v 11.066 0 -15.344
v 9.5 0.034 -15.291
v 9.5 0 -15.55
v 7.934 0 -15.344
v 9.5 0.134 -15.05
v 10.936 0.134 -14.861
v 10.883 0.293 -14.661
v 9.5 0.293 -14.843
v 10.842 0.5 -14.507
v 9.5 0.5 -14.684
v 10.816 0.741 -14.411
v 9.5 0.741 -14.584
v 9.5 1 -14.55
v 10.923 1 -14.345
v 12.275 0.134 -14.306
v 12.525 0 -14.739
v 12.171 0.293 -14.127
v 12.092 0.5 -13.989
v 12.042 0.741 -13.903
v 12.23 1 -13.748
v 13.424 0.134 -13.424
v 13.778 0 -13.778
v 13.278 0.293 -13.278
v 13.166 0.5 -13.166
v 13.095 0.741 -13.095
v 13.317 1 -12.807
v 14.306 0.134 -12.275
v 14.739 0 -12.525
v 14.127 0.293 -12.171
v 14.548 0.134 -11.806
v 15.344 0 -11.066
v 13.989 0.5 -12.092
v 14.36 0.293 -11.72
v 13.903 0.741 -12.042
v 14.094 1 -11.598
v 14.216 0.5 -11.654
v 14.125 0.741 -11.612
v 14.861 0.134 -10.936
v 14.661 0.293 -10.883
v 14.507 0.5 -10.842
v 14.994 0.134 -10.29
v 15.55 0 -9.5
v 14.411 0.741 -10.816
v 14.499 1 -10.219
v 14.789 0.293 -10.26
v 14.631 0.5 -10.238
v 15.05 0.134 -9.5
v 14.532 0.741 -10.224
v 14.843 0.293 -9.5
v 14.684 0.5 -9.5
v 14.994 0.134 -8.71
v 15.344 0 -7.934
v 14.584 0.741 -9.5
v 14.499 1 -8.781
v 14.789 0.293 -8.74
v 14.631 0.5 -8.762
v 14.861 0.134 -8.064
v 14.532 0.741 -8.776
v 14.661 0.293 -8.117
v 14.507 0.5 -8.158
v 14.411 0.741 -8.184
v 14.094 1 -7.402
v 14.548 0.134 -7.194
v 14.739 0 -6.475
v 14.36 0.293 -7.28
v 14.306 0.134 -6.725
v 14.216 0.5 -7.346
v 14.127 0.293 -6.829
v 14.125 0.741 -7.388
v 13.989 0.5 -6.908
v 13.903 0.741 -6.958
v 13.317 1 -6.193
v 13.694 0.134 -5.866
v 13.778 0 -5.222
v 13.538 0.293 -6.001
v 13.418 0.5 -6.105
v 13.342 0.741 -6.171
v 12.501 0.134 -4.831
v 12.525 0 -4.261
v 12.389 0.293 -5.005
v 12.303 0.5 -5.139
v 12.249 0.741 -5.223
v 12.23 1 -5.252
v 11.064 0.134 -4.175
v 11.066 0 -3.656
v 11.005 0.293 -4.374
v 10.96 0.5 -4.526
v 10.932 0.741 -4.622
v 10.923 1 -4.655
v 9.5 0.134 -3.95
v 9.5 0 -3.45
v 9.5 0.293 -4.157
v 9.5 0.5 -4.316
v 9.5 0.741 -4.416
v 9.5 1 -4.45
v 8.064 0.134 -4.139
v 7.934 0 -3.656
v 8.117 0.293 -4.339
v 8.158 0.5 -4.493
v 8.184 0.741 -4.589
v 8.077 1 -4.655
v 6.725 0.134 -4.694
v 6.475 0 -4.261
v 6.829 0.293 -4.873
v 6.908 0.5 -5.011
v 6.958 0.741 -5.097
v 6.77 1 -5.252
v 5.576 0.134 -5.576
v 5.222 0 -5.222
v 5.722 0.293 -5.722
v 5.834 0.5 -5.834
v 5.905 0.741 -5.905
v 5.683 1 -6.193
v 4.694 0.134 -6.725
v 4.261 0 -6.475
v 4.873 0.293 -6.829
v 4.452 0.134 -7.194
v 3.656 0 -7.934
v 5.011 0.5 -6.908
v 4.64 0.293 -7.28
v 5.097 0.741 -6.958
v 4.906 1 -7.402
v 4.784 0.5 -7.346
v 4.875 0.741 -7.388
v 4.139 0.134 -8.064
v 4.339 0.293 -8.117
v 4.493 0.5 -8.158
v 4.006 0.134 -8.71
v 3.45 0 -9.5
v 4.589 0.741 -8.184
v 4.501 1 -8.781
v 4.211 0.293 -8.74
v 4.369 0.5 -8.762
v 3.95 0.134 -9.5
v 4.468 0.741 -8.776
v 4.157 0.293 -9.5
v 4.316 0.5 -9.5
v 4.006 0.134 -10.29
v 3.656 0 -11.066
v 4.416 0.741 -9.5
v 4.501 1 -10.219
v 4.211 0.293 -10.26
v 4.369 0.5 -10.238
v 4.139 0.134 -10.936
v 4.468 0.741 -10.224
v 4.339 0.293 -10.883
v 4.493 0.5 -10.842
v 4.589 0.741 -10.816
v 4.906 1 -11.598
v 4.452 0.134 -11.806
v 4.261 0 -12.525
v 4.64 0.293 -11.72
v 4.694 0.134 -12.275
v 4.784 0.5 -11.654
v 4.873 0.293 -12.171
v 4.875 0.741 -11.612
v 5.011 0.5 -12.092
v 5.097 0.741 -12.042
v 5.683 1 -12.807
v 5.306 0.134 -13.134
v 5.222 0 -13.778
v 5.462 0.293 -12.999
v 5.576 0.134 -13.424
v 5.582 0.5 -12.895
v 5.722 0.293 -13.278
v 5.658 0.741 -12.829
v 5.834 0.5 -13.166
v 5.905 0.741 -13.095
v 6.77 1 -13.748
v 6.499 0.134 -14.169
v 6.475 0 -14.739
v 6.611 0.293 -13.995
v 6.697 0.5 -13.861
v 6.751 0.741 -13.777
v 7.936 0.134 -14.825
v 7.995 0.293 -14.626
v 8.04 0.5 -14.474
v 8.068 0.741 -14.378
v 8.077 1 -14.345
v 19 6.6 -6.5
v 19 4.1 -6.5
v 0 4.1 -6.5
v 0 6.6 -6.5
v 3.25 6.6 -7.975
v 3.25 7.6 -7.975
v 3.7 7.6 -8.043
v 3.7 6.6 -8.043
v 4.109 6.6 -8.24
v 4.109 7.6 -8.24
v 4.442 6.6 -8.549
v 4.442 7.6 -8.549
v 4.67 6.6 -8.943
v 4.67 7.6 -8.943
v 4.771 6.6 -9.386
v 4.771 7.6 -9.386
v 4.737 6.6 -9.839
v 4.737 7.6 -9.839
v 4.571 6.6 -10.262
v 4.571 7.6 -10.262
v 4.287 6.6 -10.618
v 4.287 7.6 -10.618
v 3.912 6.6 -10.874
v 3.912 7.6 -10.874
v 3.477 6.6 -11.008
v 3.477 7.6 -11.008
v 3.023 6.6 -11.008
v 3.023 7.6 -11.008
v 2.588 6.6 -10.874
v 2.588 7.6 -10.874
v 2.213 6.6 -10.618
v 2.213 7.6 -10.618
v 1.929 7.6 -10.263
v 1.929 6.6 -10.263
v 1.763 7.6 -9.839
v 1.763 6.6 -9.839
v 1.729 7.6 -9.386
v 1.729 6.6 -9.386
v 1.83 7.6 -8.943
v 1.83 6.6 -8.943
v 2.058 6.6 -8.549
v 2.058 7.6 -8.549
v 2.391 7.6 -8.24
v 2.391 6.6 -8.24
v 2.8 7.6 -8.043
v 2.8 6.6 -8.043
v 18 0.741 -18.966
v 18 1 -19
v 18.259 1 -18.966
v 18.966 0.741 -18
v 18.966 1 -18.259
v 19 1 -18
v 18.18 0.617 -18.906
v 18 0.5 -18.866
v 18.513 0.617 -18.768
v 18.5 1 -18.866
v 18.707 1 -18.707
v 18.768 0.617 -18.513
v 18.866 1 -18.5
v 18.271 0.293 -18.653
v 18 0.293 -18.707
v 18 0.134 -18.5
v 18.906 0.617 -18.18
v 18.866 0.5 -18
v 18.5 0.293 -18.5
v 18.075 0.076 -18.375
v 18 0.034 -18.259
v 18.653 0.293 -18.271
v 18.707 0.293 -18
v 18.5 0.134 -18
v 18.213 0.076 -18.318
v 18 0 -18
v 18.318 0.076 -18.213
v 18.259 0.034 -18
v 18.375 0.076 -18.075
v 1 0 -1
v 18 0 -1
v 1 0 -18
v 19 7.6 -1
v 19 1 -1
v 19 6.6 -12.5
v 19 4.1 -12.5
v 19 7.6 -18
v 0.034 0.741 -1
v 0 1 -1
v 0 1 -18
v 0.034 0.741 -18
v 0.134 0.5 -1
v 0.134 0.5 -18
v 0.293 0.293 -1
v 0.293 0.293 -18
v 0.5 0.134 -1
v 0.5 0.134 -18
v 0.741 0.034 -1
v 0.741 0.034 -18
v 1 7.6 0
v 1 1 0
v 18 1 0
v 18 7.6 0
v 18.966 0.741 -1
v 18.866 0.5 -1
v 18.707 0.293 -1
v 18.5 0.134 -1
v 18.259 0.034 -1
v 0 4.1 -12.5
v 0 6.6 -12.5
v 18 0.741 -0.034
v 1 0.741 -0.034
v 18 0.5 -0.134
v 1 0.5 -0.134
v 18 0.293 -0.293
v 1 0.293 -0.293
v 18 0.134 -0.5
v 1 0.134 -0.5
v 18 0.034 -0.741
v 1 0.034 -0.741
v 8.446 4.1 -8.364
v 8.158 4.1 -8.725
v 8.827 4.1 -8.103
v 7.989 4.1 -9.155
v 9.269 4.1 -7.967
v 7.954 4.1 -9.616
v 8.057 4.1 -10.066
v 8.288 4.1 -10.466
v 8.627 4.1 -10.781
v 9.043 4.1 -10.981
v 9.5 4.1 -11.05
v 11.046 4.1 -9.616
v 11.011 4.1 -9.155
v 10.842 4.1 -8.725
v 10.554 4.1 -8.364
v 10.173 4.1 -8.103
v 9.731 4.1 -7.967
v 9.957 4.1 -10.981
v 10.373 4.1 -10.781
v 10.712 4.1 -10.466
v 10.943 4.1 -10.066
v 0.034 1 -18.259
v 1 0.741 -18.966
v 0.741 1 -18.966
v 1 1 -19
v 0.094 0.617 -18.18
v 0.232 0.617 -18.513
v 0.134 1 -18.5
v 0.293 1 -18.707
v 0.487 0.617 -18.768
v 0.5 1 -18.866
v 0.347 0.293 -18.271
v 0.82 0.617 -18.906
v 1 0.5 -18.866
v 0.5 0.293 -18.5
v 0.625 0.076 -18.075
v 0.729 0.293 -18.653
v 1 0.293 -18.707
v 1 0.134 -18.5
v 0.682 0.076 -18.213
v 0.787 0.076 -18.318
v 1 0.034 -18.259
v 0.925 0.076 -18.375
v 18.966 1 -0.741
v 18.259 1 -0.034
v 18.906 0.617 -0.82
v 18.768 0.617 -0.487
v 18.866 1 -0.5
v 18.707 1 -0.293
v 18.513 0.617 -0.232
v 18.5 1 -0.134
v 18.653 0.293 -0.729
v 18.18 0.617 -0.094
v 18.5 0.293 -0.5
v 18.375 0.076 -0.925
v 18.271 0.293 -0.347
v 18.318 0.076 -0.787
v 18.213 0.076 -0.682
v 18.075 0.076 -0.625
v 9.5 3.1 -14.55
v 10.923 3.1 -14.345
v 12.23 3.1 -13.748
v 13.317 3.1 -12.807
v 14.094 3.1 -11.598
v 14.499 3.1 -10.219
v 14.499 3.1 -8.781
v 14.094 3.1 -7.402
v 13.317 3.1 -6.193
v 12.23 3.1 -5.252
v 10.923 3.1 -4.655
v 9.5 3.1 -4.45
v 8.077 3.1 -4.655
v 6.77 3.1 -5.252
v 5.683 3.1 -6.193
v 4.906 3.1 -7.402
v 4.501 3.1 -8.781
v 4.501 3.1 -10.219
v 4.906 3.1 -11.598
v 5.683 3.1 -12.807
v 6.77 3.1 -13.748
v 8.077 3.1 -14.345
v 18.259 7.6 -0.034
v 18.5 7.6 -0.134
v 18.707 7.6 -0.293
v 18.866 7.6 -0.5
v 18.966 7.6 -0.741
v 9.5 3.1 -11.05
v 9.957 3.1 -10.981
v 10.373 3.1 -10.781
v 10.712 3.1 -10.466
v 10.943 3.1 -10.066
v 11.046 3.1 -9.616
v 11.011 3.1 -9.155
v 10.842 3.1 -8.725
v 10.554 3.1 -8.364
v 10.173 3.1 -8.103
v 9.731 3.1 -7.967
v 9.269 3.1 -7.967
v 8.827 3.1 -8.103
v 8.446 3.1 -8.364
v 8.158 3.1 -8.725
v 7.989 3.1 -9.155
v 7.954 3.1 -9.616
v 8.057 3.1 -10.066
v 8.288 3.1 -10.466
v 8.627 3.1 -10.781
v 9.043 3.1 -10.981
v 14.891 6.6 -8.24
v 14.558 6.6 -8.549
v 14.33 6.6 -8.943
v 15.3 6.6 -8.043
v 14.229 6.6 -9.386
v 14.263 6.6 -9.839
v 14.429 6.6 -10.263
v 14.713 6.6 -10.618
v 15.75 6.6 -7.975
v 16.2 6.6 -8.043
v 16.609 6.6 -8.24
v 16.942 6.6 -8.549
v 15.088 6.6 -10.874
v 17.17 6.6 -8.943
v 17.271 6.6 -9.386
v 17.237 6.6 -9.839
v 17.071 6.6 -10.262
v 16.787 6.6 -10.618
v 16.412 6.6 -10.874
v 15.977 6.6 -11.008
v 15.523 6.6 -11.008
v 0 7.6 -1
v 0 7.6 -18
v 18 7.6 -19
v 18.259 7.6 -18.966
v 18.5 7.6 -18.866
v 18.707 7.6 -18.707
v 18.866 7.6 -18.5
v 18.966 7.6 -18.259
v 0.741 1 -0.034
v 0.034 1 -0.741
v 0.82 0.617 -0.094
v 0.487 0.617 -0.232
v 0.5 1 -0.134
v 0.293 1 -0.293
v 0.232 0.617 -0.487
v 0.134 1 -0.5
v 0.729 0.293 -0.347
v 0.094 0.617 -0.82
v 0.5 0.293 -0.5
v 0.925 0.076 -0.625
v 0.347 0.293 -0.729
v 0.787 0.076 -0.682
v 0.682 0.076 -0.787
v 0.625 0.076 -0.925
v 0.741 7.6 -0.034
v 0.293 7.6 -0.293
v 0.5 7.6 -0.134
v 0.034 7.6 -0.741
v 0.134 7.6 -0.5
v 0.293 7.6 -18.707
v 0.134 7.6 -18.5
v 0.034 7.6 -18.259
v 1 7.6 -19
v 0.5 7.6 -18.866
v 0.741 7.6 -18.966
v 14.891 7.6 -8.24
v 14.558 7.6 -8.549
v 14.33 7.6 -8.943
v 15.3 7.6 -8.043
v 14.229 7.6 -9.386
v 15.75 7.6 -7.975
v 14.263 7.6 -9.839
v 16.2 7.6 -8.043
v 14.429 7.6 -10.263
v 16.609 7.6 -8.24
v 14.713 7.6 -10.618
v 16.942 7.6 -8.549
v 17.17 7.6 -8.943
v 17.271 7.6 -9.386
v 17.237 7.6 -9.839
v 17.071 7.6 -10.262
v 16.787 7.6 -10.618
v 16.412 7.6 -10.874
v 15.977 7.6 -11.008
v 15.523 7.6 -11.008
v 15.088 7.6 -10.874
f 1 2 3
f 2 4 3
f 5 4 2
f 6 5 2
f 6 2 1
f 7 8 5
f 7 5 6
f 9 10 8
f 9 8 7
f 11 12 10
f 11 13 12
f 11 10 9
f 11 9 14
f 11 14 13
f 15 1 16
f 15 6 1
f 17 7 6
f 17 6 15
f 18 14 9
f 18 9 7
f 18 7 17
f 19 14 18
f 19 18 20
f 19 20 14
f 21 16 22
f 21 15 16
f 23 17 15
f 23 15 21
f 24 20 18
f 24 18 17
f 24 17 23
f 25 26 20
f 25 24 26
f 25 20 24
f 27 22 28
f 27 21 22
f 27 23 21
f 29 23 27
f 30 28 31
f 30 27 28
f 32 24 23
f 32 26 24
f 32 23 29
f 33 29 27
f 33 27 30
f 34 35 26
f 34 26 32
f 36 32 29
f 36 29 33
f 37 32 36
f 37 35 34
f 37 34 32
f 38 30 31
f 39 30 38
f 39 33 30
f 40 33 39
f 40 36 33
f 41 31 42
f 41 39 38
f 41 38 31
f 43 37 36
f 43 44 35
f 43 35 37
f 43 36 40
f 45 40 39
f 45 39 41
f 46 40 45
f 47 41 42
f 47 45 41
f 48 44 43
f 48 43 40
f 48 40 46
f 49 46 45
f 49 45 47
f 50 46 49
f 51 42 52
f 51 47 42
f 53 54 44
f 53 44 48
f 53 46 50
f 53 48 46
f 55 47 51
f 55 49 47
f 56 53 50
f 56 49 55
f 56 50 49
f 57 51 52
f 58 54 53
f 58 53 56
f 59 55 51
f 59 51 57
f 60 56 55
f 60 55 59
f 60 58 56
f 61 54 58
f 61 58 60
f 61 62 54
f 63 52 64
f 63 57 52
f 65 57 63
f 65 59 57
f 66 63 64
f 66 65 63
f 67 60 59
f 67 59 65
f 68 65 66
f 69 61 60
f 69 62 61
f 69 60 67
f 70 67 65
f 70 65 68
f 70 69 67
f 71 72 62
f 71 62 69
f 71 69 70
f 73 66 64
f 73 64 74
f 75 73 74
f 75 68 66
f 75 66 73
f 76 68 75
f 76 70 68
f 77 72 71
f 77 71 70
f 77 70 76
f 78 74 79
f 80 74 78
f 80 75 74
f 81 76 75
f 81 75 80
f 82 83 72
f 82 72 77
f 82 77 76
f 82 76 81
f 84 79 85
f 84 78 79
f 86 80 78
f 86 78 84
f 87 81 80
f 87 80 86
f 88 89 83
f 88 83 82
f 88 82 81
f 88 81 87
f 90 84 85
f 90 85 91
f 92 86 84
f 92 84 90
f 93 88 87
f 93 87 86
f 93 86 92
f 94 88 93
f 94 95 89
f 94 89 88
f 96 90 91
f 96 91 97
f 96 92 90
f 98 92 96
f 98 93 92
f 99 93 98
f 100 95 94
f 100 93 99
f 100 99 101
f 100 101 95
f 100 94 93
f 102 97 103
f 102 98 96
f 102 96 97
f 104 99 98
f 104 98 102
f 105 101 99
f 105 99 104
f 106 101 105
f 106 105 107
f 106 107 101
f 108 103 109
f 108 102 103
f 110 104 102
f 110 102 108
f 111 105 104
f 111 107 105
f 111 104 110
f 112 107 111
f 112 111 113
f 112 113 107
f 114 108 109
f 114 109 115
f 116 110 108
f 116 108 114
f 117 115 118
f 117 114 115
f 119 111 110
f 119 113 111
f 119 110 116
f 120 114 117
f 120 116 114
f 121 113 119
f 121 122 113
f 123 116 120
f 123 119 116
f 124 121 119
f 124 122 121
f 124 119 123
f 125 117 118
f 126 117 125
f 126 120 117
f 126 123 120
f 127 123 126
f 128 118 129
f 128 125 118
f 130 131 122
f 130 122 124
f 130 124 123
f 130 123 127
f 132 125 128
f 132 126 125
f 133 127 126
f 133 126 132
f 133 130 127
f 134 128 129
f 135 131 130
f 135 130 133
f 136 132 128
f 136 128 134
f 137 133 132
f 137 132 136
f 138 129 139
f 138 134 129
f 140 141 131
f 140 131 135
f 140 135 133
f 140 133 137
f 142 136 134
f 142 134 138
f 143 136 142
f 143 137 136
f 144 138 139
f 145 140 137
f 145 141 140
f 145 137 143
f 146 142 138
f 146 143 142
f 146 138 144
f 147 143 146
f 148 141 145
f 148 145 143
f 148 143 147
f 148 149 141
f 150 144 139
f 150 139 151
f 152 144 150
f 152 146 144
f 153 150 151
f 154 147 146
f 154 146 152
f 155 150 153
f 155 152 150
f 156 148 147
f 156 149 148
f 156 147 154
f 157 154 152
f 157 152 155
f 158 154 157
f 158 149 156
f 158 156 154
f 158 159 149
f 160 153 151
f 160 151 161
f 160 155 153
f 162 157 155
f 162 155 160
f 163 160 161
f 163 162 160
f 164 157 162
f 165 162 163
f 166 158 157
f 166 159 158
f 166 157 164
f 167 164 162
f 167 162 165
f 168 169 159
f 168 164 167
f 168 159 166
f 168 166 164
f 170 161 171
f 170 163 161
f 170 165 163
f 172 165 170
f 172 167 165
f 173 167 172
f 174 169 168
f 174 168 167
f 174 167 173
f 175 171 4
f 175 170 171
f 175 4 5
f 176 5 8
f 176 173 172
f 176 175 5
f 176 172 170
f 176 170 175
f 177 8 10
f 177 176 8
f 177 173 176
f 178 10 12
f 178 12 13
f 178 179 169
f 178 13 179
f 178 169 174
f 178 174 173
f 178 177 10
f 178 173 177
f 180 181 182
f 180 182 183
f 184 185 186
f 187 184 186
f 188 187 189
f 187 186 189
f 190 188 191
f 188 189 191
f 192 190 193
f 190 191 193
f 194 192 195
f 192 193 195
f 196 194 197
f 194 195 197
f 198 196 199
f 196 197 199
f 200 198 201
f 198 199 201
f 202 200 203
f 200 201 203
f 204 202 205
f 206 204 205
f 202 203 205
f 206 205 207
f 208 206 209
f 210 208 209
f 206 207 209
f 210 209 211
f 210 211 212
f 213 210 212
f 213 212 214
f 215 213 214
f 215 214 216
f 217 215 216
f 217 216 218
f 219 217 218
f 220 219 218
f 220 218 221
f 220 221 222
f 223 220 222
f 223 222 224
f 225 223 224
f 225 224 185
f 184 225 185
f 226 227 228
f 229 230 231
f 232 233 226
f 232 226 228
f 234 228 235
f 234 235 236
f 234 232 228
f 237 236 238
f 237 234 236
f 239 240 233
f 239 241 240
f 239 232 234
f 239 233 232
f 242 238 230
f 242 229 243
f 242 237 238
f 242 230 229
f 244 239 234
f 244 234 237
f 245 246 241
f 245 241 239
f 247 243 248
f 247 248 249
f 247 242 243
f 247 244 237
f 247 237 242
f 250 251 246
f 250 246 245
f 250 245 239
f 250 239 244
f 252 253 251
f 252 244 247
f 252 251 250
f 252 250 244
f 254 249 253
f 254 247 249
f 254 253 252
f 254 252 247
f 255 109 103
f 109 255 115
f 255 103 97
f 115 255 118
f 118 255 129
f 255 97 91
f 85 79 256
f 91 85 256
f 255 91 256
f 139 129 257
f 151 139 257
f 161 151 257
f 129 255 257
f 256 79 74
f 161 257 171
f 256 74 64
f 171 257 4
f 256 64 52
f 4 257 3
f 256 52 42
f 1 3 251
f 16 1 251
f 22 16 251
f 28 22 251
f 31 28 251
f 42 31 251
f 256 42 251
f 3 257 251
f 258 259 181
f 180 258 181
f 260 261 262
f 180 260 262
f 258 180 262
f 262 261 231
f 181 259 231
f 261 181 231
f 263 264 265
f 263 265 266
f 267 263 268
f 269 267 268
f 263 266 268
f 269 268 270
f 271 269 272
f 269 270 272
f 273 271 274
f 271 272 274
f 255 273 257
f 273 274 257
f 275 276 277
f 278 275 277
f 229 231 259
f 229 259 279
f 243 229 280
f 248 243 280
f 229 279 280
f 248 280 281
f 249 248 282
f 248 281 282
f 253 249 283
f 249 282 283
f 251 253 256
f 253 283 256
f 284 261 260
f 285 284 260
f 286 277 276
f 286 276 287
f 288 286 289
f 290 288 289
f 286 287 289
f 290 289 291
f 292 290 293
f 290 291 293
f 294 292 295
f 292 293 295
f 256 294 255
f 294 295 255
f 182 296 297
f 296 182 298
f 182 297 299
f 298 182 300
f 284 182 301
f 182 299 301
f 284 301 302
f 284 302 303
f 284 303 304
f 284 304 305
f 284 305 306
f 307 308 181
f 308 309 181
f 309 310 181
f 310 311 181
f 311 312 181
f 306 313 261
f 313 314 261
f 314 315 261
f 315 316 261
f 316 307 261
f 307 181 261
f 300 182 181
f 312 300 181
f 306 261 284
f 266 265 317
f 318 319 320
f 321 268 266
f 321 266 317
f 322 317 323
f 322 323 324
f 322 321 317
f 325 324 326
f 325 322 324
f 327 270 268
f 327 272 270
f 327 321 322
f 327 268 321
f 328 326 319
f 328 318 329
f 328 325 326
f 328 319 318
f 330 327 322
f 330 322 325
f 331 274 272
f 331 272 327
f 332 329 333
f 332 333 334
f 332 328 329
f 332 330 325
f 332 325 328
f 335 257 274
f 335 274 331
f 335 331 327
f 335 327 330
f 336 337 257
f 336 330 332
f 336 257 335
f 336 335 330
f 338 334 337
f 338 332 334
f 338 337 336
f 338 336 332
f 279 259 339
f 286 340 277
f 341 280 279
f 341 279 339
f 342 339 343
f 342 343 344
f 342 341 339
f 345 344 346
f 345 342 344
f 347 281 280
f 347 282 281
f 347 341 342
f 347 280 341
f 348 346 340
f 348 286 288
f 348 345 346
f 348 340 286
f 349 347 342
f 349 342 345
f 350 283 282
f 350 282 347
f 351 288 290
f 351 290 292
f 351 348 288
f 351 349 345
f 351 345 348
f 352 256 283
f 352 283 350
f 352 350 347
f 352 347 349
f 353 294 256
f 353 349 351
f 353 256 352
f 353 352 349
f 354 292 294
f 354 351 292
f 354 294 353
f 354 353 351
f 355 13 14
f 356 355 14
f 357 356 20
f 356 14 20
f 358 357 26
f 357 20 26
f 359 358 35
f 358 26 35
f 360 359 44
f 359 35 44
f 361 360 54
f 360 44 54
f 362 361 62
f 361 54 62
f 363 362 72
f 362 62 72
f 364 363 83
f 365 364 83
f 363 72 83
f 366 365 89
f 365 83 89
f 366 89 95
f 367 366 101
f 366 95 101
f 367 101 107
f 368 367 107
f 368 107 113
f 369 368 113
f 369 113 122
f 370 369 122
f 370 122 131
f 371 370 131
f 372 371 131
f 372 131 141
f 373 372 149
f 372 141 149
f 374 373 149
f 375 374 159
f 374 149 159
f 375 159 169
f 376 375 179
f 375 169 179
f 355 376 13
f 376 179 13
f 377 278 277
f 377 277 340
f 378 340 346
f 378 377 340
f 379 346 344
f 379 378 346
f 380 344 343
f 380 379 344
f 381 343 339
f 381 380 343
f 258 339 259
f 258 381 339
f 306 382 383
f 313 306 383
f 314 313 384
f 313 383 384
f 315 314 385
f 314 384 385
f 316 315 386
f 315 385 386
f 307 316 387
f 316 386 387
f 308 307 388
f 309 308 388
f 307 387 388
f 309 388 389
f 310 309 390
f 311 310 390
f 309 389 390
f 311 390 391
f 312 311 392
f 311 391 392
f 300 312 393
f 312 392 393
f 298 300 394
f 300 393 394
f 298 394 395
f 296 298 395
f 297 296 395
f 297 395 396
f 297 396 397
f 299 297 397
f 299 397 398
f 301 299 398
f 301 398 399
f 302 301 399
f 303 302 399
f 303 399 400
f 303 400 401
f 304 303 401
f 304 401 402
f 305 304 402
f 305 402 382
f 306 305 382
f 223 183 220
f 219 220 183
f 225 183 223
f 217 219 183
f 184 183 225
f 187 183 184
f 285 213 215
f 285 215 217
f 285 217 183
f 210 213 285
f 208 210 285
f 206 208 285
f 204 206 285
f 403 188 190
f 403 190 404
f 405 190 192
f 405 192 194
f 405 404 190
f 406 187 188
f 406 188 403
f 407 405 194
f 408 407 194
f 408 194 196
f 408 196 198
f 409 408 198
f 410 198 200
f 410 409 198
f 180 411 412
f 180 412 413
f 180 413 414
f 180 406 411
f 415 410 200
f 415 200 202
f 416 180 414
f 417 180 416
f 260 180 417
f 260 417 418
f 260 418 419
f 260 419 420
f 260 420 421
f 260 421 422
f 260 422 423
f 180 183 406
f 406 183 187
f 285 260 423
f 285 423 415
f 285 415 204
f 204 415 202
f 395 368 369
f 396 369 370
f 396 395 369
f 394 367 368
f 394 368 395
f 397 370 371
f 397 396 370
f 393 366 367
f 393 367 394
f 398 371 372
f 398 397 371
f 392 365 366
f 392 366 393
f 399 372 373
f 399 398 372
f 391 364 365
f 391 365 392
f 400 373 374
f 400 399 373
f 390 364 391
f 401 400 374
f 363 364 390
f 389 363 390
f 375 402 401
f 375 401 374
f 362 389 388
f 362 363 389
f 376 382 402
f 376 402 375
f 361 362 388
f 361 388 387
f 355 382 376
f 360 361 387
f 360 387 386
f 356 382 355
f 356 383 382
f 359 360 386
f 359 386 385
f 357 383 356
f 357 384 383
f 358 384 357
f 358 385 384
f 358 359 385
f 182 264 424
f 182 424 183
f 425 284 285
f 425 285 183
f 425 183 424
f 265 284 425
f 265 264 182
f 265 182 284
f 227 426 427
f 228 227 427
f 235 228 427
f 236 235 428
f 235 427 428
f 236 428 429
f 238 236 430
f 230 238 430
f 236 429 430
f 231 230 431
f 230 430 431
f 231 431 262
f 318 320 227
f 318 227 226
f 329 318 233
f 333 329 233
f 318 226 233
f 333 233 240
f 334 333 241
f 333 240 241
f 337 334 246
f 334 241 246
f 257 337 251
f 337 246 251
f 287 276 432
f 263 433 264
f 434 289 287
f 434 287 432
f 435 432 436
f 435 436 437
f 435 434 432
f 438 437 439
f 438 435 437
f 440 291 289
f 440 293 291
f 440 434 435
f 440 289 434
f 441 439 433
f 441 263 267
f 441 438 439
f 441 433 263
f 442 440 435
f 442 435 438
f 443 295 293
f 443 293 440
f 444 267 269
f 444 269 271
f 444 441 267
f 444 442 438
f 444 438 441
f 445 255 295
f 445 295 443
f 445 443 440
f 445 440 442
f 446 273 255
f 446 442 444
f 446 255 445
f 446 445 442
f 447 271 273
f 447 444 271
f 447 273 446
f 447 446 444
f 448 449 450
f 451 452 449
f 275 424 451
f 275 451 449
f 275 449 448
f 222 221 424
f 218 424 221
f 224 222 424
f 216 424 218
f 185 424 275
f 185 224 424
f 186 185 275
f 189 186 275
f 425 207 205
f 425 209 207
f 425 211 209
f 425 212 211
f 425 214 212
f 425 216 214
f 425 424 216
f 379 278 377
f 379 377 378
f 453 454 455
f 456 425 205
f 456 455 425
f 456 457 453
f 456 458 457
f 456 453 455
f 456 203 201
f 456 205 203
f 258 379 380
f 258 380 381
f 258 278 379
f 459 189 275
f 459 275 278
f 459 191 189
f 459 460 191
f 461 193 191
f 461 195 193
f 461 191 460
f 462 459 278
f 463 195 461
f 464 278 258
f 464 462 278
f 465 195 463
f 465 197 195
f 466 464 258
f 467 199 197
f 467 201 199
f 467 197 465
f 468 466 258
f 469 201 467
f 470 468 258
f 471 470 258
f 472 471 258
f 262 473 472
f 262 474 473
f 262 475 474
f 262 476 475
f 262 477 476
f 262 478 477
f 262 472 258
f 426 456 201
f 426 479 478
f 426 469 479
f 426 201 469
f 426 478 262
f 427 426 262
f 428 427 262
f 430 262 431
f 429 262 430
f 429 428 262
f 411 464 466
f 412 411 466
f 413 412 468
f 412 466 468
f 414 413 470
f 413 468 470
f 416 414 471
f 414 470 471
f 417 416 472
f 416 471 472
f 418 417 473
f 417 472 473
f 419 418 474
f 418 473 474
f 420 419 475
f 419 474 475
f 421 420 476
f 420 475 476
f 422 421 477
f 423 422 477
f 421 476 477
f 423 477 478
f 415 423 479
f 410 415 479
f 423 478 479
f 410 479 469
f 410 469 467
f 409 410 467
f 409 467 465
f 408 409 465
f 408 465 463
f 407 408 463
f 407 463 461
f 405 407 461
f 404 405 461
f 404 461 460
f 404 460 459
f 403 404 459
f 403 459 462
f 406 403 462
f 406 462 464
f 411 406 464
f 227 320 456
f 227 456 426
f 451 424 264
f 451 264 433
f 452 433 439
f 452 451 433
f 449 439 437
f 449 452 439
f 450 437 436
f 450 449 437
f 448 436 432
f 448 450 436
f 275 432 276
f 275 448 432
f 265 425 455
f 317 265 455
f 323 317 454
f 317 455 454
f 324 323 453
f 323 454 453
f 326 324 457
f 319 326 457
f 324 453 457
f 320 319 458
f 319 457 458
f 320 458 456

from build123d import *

# Parameters (mm, degrees)
SKETCH1_W           = 19
SKETCH1_H           = 19
BOSS_EXTRUDE1_DEPTH = 7.6
CUT_EXTRUDE1_REACH  = 29.924
SKETCH2_W           = 6
SKETCH2_H           = 2.5
CUT_EXTRUDE2_REACH  = 29.924
SKETCH3_R           = 1.525
SKETCH4_R           = 5.05
CUT_EXTRUDE3_DEPTH  = 3.1
FILLET1_R           = 1
FILLET2_R           = 1
CUT_EXTRUDE4_REACH  = 29.244
SKETCH5_R           = 1.55


with BuildPart() as part:
    # Sketch1 → Boss-Extrude1 (new body)
    with BuildSketch(Plane(origin=(0, 0, 0), x_dir=(1, 0, 0), z_dir=(0, 1, 0))):
        with Locations((9.5, 9.5)):
            Rectangle(SKETCH1_W, SKETCH1_H)
    extrude(amount=BOSS_EXTRUDE1_DEPTH)

    # Sketch2 → Cut-Extrude1 (cut, up to next)
    with BuildSketch(Plane(origin=(19, 0, 0), x_dir=(0, 0, -1), z_dir=(1, 0, 0)), mode=Mode.PRIVATE) as cut_extrude1_sk1:
        with Locations((9.5, 5.35)):
            Rectangle(SKETCH2_W, SKETCH2_H)
    cut_extrude1_tool1 = extrude(cut_extrude1_sk1.sketch, amount=-CUT_EXTRUDE1_REACH, mode=Mode.PRIVATE) & part.part
    add(cut_extrude1_tool1.solids().sort_by_distance((19, 5.35, -9.5))[0], mode=Mode.SUBTRACT)

    # Sketch3 → Cut-Extrude2 (cut, up to next)
    with BuildSketch(Plane(origin=(0, 7.6, 0), x_dir=(1, 0, 0), z_dir=(0, 1, 0)), mode=Mode.PRIVATE) as cut_extrude2_sk1:
        with Locations(Location((3.25, 9.5, 0), (0, 0, 270))):
            Circle(SKETCH3_R)
    cut_extrude2_tool1 = extrude(cut_extrude2_sk1.sketch, amount=-CUT_EXTRUDE2_REACH, mode=Mode.PRIVATE) & part.part
    # Sketch3 → Cut-Extrude2 (cut, up to next)
    with BuildSketch(Plane(origin=(0, 7.6, 0), x_dir=(1, 0, 0), z_dir=(0, 1, 0)), mode=Mode.PRIVATE) as cut_extrude2_sk2:
        with Locations(Location((15.75, 9.5, 0), (0, 0, 270))):
            Circle(SKETCH3_R)
    cut_extrude2_tool2 = extrude(cut_extrude2_sk2.sketch, amount=-CUT_EXTRUDE2_REACH, mode=Mode.PRIVATE) & part.part
    add(cut_extrude2_tool1.solids().sort_by_distance((3.25, 7.6, -9.5))[0], mode=Mode.SUBTRACT)
    add(cut_extrude2_tool2.solids().sort_by_distance((15.75, 7.6, -9.5))[0], mode=Mode.SUBTRACT)

    # Sketch4 → Cut-Extrude3 (cut)
    with BuildSketch(Plane.XZ):
        with Locations(Location((9.5, -9.5, 0), (0, 0, 270))):
            Circle(SKETCH4_R)
    extrude(amount=-CUT_EXTRUDE3_DEPTH, mode=Mode.SUBTRACT)

    # Fillet1
    fillet1_edges = [part.edges().sort_by_distance(p)[0] for p in [
        (0, 3.8, -19),
        (19, 3.8, -19),
        (19, 3.8, 0),
        (0, 3.8, 0),
    ]]
    fillet(fillet1_edges, radius=FILLET1_R)

    # Fillet2
    fillet2_edges = [part.edges().sort_by_distance(p)[0] for p in [
        (9.5, 0, -4.45),
        (0, 0, -9.5),
        (9.5, 0, -19),
        (19, 0, -9.5),
        (9.5, 0, 0),
        (18.707106781, 0, -0.292893219),
        (0.292893219, 0, -0.292893219),
        (18.707106781, 0, -18.707106781),
        (0.292893219, 0, -18.707106781),
    ]]
    fillet(fillet2_edges, radius=FILLET2_R)

    # Sketch5 → Cut-Extrude4 (cut, up to next)
    with BuildSketch(Plane.XZ.offset(-3.1), mode=Mode.PRIVATE) as cut_extrude4_sk1:
        with Locations(Location((9.5, -9.5, 0), (0, 0, 270))):
            Circle(SKETCH5_R)
    cut_extrude4_tool1 = extrude(cut_extrude4_sk1.sketch, amount=-CUT_EXTRUDE4_REACH, mode=Mode.PRIVATE) & part.part
    add(cut_extrude4_tool1.solids().sort_by_distance((9.5, 3.1, -9.5))[0], mode=Mode.SUBTRACT)


solid = part.part
